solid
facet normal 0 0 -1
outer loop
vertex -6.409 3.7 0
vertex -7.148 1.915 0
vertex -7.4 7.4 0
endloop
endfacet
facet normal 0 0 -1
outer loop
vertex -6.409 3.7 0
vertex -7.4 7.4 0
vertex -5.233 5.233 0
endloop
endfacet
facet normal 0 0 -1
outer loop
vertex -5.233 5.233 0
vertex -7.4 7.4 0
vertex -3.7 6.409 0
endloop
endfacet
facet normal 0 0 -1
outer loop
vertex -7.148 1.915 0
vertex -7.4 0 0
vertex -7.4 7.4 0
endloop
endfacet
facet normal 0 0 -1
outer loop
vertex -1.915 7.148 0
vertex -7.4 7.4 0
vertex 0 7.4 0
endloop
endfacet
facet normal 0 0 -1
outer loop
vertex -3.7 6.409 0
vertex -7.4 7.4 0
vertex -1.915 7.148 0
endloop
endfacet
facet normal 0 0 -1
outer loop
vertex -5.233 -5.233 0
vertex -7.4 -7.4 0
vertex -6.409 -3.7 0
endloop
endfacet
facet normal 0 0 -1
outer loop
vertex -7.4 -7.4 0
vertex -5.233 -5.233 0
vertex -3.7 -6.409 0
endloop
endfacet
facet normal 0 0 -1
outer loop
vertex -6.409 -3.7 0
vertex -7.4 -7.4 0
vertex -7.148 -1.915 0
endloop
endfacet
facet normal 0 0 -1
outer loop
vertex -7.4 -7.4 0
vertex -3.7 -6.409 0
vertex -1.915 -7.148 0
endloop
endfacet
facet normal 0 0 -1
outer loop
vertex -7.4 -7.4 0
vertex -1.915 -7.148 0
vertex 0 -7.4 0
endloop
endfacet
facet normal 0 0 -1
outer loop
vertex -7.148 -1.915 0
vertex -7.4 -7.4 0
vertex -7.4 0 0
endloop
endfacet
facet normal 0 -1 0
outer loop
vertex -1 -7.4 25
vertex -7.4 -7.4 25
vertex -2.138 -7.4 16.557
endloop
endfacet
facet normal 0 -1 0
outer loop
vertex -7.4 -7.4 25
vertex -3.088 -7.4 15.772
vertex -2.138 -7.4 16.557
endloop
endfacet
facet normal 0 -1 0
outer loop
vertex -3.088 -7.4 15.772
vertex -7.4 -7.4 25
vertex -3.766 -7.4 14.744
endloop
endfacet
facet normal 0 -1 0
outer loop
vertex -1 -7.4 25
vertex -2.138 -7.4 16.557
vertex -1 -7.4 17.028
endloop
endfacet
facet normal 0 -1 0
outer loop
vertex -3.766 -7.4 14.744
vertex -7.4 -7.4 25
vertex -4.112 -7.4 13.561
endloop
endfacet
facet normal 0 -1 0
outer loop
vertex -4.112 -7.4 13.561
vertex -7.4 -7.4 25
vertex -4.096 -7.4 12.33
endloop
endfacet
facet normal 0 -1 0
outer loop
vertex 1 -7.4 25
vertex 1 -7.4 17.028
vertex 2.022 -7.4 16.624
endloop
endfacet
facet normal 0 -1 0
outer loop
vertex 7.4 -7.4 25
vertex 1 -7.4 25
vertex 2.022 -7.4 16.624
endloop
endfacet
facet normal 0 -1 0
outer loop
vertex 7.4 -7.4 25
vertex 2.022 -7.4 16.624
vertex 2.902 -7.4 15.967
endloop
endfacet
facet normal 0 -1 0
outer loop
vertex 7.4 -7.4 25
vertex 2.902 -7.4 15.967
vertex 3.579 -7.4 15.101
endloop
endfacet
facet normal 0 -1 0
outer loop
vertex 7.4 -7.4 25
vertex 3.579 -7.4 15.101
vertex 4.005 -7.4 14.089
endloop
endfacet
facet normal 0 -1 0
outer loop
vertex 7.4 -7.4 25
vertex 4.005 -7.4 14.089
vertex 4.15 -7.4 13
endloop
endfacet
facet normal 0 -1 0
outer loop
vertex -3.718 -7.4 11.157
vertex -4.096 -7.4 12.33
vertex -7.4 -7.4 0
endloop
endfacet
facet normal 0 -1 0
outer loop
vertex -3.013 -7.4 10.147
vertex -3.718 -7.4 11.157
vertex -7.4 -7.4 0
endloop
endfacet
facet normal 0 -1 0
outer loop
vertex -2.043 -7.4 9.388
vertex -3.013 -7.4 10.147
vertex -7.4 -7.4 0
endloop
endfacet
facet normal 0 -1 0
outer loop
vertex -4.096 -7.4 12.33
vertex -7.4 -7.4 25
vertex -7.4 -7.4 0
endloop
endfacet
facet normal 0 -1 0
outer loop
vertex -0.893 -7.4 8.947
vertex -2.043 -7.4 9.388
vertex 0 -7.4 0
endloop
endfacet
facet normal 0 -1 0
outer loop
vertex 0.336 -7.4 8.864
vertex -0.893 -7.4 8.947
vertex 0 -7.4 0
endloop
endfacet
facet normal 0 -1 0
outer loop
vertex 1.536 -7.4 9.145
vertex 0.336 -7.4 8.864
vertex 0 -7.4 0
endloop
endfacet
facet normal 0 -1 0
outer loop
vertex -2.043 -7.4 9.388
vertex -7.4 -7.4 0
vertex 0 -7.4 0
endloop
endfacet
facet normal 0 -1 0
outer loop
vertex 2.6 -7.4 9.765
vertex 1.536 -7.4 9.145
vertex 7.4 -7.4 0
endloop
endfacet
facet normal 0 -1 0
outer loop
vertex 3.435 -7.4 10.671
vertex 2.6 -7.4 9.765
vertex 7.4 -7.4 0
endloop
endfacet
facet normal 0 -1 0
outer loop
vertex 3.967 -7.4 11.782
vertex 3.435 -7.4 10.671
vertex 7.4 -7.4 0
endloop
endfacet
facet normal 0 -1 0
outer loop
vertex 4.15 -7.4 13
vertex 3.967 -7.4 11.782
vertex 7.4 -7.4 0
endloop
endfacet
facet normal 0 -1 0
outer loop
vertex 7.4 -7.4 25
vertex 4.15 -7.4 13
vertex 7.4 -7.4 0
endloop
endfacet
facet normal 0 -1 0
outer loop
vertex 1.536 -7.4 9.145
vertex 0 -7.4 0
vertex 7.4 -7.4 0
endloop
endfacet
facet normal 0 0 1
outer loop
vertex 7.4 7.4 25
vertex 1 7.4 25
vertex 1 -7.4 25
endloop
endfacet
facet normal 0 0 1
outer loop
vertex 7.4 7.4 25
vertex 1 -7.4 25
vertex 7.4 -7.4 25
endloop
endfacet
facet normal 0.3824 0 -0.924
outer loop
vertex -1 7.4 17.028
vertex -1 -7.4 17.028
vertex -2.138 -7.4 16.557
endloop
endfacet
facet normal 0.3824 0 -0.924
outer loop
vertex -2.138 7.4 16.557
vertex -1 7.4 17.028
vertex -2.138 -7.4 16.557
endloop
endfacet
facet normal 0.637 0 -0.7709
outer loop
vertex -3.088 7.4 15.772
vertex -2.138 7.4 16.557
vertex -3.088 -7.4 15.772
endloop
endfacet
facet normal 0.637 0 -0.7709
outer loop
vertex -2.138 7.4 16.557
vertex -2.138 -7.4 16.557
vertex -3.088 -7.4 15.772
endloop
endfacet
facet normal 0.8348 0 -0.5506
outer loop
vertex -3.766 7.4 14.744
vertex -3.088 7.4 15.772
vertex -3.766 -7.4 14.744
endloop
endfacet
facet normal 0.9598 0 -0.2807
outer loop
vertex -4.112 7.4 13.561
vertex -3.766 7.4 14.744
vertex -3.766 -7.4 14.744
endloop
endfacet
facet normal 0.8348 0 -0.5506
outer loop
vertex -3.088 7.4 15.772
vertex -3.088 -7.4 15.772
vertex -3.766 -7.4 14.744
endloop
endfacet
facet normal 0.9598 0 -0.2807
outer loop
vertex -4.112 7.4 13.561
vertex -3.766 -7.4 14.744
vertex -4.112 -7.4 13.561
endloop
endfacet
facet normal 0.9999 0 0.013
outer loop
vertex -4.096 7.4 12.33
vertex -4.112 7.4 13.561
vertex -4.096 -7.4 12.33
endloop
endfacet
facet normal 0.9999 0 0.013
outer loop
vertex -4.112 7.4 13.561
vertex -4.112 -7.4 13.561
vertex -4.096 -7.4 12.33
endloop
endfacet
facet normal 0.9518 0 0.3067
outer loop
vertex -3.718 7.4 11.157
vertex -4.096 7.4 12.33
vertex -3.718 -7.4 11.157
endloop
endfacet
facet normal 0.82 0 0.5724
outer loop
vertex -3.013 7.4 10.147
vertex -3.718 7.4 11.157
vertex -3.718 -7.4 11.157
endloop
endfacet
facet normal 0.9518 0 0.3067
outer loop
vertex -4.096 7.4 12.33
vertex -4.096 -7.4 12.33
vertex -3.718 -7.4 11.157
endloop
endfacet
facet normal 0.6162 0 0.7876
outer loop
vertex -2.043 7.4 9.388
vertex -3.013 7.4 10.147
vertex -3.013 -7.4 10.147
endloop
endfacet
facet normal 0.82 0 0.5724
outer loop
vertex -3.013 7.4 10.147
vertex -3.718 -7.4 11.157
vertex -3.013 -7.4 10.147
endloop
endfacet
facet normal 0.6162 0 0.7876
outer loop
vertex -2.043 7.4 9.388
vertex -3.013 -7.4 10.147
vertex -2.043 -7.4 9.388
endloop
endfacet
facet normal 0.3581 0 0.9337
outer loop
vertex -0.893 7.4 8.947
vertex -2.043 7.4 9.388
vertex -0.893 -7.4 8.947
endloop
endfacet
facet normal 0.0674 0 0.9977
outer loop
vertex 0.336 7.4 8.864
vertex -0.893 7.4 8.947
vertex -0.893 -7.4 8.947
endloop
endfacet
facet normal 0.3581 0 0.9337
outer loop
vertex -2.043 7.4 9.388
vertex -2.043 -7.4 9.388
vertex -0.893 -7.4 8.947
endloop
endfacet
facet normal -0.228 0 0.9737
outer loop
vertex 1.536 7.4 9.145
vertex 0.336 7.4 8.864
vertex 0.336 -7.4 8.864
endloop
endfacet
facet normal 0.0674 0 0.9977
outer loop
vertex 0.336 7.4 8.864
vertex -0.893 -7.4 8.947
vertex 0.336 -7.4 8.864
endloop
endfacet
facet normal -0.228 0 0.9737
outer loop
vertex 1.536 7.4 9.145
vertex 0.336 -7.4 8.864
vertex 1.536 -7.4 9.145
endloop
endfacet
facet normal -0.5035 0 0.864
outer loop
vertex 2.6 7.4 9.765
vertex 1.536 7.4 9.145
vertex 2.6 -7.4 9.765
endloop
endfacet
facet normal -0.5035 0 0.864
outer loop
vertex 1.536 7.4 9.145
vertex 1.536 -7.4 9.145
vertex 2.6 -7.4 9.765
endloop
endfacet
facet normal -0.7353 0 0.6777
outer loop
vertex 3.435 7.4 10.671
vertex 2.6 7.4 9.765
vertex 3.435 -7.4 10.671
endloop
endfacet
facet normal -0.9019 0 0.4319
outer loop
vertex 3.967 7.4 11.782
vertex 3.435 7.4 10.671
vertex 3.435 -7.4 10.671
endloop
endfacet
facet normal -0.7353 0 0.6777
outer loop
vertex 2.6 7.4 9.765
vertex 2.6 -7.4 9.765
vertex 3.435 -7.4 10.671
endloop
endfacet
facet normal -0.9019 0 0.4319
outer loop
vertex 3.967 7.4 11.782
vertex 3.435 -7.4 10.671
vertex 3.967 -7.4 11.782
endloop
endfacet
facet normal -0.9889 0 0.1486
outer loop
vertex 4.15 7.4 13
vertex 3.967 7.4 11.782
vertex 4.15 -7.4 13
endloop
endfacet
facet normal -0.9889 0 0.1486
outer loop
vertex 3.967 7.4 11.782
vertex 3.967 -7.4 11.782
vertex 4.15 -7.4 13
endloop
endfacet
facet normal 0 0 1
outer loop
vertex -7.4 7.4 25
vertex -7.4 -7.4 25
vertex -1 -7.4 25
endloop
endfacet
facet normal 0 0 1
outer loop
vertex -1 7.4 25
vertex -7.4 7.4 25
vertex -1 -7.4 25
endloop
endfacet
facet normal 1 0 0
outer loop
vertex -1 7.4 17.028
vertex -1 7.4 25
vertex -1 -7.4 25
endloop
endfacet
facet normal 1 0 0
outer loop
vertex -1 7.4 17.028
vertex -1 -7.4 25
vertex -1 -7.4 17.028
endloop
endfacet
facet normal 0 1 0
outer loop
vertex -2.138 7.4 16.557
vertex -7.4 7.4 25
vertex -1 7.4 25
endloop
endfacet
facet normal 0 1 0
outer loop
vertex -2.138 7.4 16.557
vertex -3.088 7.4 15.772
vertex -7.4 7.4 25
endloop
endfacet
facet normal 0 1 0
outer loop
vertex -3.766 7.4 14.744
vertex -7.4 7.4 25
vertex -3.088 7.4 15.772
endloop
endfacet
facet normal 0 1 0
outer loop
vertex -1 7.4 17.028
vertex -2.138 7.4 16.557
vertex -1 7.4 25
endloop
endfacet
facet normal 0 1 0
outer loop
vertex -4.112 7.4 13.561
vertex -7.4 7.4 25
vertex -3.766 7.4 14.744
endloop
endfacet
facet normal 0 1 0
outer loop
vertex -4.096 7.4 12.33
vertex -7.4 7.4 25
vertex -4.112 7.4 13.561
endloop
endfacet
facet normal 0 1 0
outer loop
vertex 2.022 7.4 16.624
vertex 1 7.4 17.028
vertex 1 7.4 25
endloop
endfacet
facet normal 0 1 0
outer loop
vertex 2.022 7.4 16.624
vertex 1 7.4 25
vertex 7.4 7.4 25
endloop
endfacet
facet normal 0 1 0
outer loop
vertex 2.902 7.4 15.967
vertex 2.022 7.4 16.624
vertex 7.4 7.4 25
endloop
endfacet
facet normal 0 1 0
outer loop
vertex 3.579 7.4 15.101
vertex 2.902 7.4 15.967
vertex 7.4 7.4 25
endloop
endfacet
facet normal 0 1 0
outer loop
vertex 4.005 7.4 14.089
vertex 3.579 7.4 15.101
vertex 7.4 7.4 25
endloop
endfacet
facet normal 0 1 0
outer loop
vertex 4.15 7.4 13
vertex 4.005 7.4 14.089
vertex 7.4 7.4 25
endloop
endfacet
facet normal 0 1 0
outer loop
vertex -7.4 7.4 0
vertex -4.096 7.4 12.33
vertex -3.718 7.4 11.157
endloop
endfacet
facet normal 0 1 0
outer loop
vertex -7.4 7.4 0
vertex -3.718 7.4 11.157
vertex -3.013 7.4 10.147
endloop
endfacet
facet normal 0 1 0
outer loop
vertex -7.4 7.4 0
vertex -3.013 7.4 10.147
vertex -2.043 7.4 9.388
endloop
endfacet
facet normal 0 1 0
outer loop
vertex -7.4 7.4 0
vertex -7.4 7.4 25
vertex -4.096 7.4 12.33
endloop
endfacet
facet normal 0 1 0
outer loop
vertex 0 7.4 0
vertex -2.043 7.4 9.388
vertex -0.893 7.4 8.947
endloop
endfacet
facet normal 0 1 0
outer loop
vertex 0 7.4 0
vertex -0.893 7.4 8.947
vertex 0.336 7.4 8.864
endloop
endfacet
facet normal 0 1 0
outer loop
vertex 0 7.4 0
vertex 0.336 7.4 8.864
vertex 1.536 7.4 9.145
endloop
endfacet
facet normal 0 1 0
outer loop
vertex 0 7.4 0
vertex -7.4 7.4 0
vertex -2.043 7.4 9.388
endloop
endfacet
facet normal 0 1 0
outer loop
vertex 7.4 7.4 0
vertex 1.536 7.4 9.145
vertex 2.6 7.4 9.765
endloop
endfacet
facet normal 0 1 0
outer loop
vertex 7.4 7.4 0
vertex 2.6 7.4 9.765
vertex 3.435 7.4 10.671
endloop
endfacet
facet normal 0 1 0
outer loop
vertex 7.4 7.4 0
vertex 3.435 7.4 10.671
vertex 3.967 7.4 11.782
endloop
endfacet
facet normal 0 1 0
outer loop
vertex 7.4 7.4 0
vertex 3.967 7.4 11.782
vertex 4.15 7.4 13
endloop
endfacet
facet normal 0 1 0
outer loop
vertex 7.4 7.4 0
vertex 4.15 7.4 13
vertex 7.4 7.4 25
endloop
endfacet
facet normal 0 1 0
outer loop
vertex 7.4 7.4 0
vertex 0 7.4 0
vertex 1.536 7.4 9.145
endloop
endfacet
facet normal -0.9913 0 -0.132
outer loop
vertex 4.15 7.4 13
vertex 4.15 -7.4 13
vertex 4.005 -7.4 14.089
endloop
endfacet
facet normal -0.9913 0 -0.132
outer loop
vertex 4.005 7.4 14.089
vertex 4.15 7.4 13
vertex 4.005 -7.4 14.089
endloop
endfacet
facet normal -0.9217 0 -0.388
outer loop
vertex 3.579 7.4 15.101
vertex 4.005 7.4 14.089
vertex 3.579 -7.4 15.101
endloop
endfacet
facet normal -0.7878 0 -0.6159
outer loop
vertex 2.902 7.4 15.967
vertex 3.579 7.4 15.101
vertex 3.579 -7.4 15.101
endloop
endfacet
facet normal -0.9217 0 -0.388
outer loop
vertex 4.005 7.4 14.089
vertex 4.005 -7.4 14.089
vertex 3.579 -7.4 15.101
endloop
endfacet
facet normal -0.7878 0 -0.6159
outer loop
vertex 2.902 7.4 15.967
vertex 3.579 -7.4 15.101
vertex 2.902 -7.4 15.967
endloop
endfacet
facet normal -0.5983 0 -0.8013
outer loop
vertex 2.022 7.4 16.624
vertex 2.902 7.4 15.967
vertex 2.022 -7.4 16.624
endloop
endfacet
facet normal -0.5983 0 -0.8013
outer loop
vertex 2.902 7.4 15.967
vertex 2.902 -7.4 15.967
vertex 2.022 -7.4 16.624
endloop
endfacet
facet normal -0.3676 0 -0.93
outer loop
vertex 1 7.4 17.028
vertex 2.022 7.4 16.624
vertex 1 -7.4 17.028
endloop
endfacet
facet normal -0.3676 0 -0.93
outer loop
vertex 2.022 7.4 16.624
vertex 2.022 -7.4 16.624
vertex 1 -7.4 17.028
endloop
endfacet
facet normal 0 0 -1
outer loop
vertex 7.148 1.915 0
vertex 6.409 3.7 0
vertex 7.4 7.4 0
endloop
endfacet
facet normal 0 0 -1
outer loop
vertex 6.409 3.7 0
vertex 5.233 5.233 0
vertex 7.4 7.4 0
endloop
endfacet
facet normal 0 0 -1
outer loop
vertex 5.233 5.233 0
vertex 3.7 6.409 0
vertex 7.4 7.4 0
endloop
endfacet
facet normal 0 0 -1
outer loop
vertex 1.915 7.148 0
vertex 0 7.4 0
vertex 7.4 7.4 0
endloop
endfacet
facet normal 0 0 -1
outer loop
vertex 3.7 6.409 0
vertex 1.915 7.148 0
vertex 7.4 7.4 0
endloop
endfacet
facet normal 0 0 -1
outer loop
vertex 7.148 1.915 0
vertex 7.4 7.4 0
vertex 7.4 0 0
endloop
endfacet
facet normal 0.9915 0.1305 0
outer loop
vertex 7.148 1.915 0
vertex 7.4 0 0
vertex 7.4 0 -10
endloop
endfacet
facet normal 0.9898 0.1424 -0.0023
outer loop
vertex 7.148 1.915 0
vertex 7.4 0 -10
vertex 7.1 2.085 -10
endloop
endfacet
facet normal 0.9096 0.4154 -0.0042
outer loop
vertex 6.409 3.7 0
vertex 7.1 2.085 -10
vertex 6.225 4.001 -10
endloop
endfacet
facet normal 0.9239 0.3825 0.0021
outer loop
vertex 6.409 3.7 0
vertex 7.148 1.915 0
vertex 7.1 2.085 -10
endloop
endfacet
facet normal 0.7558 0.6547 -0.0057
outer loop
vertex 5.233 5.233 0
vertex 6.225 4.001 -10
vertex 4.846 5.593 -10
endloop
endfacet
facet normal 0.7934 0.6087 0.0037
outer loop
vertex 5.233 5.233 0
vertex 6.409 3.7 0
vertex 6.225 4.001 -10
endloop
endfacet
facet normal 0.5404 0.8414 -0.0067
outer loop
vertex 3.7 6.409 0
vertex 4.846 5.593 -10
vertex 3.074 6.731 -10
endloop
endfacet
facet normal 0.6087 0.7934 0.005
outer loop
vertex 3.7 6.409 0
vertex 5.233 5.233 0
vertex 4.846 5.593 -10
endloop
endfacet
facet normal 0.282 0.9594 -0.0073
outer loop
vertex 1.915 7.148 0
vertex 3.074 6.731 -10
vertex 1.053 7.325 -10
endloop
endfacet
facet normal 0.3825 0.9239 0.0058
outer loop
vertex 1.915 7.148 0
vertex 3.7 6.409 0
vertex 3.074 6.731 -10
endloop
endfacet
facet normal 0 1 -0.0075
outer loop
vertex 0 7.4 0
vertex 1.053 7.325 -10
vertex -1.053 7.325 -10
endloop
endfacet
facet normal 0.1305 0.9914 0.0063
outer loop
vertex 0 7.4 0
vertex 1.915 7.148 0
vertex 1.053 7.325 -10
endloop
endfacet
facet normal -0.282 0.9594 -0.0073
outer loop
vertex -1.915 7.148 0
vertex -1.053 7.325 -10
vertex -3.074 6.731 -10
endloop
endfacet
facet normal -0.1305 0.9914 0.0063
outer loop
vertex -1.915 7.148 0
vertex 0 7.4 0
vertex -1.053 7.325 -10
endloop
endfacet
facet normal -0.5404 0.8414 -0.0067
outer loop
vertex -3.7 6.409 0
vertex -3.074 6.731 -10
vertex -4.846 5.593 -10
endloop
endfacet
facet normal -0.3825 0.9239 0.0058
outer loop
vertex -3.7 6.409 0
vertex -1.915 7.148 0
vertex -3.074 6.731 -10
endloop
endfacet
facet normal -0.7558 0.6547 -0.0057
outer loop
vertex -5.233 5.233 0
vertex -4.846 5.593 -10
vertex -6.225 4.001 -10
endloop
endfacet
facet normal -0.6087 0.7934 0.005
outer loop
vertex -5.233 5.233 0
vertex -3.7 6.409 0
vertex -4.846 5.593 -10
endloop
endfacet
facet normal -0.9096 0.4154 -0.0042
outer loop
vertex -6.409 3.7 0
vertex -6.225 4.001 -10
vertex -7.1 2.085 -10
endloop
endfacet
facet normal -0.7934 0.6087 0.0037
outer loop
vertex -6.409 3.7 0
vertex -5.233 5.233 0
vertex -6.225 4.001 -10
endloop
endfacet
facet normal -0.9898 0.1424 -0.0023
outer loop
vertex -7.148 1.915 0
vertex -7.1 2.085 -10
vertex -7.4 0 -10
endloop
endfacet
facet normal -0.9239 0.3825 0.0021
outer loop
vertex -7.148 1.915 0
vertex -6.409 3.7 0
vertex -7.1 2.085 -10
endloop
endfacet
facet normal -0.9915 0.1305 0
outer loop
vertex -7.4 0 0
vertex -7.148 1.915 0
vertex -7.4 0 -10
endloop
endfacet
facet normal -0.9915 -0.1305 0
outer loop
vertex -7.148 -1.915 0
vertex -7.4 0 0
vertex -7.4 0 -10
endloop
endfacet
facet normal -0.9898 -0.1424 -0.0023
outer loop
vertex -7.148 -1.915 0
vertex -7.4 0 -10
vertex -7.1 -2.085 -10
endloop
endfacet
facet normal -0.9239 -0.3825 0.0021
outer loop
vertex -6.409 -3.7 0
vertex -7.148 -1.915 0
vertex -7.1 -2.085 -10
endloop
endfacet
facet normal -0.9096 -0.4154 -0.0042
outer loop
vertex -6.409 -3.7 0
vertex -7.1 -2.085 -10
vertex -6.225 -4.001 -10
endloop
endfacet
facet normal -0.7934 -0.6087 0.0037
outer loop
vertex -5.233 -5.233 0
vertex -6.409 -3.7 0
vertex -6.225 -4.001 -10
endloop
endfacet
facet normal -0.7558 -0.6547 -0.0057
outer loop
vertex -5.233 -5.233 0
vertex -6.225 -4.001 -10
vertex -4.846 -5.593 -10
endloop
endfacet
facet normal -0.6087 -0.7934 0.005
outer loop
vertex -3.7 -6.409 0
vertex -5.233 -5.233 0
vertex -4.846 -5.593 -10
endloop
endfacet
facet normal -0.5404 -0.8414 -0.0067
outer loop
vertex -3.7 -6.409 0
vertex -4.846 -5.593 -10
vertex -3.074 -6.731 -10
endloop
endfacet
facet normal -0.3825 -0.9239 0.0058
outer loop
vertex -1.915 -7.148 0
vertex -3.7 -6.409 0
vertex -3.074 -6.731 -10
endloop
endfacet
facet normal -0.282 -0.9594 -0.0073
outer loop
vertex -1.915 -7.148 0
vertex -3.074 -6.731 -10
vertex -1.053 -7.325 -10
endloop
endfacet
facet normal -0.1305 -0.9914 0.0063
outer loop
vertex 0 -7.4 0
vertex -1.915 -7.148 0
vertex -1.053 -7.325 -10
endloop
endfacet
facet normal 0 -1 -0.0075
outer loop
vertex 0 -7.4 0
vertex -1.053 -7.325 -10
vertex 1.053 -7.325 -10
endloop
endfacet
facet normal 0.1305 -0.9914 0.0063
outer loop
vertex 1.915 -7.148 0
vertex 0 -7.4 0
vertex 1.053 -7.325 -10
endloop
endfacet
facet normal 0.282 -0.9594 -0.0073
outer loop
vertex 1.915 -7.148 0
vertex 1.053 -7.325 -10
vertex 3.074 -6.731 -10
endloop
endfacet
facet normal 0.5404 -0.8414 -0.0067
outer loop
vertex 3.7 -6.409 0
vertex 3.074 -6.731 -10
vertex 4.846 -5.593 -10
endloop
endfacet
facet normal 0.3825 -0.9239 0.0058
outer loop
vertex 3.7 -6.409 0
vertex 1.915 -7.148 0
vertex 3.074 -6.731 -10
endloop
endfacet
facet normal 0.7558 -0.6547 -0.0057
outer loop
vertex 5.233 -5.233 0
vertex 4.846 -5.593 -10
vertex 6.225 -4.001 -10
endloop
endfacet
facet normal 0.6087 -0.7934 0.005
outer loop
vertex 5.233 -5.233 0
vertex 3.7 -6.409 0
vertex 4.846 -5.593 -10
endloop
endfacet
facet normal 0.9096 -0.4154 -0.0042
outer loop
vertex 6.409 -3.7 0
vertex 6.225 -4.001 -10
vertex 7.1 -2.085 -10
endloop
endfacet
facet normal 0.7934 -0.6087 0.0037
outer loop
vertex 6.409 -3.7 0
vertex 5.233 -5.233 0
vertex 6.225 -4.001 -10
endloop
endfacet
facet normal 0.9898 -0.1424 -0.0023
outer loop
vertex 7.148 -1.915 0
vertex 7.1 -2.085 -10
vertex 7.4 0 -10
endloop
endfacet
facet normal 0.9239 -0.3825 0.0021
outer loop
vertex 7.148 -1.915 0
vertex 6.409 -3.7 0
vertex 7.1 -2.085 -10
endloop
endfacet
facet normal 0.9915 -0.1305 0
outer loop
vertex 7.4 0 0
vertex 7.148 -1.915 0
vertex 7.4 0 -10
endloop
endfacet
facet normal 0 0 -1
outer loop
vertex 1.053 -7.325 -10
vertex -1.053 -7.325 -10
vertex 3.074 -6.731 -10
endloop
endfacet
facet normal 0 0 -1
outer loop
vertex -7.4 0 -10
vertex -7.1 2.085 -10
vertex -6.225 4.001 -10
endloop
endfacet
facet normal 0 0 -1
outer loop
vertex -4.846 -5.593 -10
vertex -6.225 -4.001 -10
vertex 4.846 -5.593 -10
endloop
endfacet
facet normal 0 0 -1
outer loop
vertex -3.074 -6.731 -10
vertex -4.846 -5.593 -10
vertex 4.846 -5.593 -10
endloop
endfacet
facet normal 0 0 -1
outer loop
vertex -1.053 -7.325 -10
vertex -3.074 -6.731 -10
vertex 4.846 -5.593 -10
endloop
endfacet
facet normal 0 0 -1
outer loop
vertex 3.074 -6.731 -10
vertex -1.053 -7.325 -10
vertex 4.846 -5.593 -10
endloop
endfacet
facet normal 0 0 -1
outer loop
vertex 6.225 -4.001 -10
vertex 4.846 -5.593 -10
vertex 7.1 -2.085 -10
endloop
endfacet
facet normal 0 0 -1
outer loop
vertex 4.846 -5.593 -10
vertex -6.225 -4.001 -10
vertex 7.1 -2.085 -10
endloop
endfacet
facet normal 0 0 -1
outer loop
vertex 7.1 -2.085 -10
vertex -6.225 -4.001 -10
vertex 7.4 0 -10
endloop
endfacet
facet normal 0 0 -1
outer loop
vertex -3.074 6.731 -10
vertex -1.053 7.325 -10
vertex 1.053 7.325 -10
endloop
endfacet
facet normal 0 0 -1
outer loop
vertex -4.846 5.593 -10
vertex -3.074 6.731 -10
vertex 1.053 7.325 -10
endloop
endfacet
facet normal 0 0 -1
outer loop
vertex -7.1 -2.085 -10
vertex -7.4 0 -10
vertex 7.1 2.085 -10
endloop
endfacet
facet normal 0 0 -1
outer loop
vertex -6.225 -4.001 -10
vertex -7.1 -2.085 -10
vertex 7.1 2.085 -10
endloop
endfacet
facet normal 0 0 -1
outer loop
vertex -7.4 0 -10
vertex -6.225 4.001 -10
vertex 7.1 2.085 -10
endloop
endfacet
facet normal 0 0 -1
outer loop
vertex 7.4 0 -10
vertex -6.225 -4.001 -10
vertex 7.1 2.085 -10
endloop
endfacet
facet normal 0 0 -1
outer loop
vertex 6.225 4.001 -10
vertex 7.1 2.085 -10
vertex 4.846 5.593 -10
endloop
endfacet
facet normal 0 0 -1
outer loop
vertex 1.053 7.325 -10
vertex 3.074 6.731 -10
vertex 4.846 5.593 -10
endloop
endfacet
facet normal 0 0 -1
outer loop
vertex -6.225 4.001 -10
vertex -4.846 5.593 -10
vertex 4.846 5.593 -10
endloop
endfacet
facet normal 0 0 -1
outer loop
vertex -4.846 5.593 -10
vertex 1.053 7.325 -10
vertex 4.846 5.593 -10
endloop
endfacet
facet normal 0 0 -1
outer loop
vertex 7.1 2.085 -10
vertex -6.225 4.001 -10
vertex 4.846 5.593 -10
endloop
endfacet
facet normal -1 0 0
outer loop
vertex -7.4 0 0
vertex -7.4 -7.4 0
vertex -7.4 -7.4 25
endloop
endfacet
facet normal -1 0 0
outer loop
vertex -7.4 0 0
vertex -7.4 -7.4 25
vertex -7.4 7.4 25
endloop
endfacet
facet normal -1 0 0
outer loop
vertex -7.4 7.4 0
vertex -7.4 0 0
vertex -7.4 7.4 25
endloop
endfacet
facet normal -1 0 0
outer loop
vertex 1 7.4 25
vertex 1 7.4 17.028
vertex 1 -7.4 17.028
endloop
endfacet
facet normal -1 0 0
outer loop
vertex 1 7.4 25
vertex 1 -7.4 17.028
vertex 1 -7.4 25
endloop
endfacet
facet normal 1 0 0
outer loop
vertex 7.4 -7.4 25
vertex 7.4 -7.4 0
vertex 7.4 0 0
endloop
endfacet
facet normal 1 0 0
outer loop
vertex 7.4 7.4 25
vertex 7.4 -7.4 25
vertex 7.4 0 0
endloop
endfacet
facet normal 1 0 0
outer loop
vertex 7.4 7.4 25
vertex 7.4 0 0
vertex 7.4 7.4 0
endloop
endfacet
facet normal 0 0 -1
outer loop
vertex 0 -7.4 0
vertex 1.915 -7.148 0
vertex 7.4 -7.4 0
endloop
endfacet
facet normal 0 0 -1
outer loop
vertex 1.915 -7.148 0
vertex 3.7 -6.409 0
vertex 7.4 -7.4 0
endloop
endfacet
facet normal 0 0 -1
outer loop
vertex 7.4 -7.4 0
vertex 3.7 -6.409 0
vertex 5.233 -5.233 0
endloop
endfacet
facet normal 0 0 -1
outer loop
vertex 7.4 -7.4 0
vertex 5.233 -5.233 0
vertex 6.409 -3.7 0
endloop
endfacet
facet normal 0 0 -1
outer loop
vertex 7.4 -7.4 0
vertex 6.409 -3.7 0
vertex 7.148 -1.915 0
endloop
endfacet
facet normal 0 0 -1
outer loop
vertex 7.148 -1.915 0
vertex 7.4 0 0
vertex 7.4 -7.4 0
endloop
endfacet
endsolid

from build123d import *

# Parameters (mm, degrees)
F0_R     = 7.4
F1_DEPTH = 10
F2_W     = 14.8
F2_H     = 14.8
F3_DEPTH = 25
F5_DEPTH = 12.5


with BuildPart() as f1:
    # F0 (on Top) → F1 (new body)
    with BuildSketch(Plane.XY):
        Circle(F0_R)
    extrude(amount=-F1_DEPTH)

    # F2 (on face) → F3 (join)
    with BuildSketch(Plane.XY):
        Rectangle(F2_W, F2_H)
    extrude(amount=F3_DEPTH)

    # F4 (on Front) → F5 (cut, symmetric)
    with BuildSketch(Plane.XZ):
        with BuildLine():
            ThreePointArc((-1, 17.0277164746), (-2.5566090824, 9.7310169777), (4.15, 13))
            ThreePointArc((4.15, 13), (3.2689830223, 15.5566090824), (1, 17.0277164746))
            Line((1, 17.0277164746), (1, 13))
            Line((1, 13), (-1, 13))
            Line((-1, 13), (-1, 17.0277164746))
        make_face()
        with BuildLine():
            Line((1, 13), (1, 17.0277164746))
            ThreePointArc((1, 17.0277164746), (0, 17.15), (-1, 17.0277164746))
            Line((-1, 17.0277164746), (-1, 13))
            Line((-1, 13), (1, 13))
        make_face()
        with BuildLine():
            ThreePointArc((-1, 17.0277164746), (0, 17.15), (1, 17.0277164746))
            Line((1, 17.0277164746), (1, 25))
            Line((1, 25), (-1, 25))
            Line((-1, 25), (-1, 17.0277164746))
        make_face()
    extrude(amount=F5_DEPTH, both=True, mode=Mode.SUBTRACT)


solid = f1.part
